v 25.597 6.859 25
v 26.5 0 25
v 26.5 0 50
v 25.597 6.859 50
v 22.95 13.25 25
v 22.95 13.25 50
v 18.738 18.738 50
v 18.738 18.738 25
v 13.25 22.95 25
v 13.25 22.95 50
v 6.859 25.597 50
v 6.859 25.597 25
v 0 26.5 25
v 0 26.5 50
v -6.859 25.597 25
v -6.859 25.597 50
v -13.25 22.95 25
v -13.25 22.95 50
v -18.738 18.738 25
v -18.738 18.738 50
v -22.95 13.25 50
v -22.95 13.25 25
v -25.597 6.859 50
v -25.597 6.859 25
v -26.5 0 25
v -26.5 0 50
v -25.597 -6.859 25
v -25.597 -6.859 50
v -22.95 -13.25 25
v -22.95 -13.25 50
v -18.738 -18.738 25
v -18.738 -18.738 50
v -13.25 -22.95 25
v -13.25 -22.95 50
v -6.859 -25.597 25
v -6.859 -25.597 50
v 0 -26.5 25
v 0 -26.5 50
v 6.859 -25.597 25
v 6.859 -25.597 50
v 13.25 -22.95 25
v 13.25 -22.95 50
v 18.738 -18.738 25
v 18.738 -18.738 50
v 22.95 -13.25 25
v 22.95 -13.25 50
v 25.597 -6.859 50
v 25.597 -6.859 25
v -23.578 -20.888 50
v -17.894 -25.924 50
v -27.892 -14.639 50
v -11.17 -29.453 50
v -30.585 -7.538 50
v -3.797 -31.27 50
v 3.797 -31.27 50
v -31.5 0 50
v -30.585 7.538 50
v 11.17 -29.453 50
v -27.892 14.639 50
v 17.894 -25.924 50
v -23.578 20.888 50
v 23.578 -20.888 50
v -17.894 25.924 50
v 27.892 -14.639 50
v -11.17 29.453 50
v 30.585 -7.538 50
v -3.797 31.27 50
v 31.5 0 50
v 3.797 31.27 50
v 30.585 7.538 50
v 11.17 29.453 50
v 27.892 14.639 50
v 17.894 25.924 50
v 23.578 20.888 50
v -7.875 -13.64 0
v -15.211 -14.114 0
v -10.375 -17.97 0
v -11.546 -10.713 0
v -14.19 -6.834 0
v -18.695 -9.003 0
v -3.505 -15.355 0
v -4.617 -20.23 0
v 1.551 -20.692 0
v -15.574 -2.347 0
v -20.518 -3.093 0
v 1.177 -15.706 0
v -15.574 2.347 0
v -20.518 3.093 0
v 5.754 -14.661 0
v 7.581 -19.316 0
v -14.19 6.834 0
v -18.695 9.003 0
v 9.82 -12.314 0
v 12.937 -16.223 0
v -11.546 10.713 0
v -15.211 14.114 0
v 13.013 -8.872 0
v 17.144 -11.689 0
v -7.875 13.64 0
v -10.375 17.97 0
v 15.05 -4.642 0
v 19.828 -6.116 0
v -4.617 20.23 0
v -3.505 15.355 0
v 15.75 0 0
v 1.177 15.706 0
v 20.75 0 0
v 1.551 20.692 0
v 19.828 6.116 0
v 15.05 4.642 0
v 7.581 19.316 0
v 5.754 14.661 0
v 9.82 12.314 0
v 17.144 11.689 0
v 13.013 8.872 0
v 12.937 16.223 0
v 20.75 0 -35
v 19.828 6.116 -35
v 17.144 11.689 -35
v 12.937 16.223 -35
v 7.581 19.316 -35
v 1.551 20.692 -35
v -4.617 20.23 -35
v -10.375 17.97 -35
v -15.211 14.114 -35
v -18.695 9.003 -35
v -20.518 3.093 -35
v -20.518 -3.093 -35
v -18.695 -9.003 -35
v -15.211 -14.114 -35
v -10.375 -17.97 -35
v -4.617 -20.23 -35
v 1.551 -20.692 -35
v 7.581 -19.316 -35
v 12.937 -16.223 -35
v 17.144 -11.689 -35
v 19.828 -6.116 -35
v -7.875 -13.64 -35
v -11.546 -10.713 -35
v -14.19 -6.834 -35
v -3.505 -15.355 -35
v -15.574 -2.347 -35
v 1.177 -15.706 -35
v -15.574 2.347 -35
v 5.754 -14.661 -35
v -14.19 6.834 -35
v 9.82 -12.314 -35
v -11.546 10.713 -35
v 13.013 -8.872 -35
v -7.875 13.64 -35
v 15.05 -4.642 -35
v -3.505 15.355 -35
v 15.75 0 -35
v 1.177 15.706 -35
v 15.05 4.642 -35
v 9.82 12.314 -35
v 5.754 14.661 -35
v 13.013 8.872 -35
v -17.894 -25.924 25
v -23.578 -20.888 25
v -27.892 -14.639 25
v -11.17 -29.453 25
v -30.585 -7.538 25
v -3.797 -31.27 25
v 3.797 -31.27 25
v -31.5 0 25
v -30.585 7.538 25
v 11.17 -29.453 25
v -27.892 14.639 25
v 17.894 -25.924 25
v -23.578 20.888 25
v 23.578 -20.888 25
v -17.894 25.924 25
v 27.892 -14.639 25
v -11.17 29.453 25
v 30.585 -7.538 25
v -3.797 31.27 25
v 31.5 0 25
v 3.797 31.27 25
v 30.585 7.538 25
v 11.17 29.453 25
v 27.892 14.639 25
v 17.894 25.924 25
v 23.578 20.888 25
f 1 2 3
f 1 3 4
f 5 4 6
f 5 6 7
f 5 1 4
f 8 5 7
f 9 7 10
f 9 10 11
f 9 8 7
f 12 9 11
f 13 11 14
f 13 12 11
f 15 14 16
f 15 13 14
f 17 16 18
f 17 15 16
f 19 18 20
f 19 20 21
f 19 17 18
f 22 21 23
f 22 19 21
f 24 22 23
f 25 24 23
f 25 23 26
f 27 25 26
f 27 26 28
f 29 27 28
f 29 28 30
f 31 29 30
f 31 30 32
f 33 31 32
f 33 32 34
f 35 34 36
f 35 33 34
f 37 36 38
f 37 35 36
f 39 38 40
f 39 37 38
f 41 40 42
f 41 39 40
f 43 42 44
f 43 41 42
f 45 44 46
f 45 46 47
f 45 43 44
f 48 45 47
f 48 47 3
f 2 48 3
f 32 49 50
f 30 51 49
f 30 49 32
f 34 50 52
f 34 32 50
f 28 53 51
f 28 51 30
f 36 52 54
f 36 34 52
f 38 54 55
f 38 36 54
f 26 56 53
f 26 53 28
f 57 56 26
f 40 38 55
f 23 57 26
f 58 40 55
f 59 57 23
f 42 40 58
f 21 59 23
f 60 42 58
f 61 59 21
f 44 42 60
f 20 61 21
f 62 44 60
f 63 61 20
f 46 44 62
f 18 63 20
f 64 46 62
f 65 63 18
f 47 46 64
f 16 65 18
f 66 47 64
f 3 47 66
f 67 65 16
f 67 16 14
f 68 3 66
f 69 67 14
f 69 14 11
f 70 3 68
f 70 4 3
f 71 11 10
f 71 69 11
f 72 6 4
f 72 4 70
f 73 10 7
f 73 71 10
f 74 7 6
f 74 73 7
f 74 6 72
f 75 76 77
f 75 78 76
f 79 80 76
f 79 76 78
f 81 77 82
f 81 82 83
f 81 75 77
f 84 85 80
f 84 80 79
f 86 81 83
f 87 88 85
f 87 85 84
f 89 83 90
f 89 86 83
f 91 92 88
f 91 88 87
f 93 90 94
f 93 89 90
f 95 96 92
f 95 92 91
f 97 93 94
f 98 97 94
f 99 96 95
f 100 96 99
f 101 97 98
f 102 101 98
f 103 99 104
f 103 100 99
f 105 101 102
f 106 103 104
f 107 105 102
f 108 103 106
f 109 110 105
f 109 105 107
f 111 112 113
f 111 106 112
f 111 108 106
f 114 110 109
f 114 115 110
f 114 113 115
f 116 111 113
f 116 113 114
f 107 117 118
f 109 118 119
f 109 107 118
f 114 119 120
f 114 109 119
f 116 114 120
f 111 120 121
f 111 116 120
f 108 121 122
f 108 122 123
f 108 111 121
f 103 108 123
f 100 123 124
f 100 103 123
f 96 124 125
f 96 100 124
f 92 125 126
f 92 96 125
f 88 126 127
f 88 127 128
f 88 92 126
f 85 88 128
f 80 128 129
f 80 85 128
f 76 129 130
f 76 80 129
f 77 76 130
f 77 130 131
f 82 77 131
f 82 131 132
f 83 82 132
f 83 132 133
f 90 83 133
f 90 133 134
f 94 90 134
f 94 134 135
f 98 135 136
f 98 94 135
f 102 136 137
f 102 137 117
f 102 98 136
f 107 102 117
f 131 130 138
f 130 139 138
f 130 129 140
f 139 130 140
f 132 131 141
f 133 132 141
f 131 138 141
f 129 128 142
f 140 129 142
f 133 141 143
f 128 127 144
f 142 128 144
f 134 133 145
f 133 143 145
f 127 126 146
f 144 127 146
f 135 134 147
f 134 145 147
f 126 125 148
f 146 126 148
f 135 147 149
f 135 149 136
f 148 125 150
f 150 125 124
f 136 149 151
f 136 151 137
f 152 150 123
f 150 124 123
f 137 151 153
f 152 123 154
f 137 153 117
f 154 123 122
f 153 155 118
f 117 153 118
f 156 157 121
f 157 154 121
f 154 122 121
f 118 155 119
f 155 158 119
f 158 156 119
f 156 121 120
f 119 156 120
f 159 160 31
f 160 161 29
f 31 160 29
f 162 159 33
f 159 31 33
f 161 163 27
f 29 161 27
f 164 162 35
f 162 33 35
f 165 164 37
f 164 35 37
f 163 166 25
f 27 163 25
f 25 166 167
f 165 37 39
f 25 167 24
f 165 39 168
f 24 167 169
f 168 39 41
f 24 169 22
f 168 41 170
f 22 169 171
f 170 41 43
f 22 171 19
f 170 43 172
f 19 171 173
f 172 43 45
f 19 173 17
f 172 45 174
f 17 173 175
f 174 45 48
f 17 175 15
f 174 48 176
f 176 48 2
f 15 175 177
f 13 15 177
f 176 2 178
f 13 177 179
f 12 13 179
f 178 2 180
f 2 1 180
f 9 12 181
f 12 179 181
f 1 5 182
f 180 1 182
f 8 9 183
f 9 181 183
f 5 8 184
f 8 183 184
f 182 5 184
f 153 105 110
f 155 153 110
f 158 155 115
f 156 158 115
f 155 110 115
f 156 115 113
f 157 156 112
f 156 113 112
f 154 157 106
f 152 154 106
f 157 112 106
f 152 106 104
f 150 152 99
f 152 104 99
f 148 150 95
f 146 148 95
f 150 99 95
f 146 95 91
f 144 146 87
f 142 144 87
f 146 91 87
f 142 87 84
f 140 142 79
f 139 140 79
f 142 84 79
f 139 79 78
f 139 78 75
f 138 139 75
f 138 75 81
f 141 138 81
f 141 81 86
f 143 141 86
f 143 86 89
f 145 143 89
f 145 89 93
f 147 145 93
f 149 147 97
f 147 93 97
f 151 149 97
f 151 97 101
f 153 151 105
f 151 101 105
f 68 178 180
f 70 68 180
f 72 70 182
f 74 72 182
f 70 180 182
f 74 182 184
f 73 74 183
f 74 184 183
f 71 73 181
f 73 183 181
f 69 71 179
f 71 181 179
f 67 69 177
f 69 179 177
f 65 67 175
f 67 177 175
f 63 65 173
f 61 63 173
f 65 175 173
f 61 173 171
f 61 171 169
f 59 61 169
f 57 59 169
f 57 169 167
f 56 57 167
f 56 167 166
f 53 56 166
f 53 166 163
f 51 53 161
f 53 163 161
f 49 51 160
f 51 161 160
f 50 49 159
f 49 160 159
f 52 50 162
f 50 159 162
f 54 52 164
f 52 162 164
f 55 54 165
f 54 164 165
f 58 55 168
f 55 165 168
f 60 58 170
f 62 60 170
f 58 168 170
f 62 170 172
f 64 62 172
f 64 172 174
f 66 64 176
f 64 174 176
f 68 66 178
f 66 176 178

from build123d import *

# Parameters (mm, degrees)
F0_R     = 20.75
F0_R_2   = 15.75
F3_DEPTH = 35
F2_R     = 31.5
F2_R_2   = 26.5
F4_DEPTH = 25


# Not quite as in the source:
# - the program builds the solid bodies; features that only make, move or delete a surface that nothing else refers to are left out


with BuildPart() as f3:
    # F0 (on Top) → F3 (new body)
    with BuildSketch(Plane.XY):
        Circle(F0_R)
        Circle(F0_R_2, mode=Mode.SUBTRACT)
    extrude(amount=-F3_DEPTH)


with BuildPart() as f4:
    # F2 (on offset) → F4 (new body)
    with BuildSketch(Plane.XY.offset(25)):
        Circle(F2_R)
        Circle(F2_R_2, mode=Mode.SUBTRACT)
    extrude(amount=F4_DEPTH)


solid = Compound([f3.part, f4.part])
